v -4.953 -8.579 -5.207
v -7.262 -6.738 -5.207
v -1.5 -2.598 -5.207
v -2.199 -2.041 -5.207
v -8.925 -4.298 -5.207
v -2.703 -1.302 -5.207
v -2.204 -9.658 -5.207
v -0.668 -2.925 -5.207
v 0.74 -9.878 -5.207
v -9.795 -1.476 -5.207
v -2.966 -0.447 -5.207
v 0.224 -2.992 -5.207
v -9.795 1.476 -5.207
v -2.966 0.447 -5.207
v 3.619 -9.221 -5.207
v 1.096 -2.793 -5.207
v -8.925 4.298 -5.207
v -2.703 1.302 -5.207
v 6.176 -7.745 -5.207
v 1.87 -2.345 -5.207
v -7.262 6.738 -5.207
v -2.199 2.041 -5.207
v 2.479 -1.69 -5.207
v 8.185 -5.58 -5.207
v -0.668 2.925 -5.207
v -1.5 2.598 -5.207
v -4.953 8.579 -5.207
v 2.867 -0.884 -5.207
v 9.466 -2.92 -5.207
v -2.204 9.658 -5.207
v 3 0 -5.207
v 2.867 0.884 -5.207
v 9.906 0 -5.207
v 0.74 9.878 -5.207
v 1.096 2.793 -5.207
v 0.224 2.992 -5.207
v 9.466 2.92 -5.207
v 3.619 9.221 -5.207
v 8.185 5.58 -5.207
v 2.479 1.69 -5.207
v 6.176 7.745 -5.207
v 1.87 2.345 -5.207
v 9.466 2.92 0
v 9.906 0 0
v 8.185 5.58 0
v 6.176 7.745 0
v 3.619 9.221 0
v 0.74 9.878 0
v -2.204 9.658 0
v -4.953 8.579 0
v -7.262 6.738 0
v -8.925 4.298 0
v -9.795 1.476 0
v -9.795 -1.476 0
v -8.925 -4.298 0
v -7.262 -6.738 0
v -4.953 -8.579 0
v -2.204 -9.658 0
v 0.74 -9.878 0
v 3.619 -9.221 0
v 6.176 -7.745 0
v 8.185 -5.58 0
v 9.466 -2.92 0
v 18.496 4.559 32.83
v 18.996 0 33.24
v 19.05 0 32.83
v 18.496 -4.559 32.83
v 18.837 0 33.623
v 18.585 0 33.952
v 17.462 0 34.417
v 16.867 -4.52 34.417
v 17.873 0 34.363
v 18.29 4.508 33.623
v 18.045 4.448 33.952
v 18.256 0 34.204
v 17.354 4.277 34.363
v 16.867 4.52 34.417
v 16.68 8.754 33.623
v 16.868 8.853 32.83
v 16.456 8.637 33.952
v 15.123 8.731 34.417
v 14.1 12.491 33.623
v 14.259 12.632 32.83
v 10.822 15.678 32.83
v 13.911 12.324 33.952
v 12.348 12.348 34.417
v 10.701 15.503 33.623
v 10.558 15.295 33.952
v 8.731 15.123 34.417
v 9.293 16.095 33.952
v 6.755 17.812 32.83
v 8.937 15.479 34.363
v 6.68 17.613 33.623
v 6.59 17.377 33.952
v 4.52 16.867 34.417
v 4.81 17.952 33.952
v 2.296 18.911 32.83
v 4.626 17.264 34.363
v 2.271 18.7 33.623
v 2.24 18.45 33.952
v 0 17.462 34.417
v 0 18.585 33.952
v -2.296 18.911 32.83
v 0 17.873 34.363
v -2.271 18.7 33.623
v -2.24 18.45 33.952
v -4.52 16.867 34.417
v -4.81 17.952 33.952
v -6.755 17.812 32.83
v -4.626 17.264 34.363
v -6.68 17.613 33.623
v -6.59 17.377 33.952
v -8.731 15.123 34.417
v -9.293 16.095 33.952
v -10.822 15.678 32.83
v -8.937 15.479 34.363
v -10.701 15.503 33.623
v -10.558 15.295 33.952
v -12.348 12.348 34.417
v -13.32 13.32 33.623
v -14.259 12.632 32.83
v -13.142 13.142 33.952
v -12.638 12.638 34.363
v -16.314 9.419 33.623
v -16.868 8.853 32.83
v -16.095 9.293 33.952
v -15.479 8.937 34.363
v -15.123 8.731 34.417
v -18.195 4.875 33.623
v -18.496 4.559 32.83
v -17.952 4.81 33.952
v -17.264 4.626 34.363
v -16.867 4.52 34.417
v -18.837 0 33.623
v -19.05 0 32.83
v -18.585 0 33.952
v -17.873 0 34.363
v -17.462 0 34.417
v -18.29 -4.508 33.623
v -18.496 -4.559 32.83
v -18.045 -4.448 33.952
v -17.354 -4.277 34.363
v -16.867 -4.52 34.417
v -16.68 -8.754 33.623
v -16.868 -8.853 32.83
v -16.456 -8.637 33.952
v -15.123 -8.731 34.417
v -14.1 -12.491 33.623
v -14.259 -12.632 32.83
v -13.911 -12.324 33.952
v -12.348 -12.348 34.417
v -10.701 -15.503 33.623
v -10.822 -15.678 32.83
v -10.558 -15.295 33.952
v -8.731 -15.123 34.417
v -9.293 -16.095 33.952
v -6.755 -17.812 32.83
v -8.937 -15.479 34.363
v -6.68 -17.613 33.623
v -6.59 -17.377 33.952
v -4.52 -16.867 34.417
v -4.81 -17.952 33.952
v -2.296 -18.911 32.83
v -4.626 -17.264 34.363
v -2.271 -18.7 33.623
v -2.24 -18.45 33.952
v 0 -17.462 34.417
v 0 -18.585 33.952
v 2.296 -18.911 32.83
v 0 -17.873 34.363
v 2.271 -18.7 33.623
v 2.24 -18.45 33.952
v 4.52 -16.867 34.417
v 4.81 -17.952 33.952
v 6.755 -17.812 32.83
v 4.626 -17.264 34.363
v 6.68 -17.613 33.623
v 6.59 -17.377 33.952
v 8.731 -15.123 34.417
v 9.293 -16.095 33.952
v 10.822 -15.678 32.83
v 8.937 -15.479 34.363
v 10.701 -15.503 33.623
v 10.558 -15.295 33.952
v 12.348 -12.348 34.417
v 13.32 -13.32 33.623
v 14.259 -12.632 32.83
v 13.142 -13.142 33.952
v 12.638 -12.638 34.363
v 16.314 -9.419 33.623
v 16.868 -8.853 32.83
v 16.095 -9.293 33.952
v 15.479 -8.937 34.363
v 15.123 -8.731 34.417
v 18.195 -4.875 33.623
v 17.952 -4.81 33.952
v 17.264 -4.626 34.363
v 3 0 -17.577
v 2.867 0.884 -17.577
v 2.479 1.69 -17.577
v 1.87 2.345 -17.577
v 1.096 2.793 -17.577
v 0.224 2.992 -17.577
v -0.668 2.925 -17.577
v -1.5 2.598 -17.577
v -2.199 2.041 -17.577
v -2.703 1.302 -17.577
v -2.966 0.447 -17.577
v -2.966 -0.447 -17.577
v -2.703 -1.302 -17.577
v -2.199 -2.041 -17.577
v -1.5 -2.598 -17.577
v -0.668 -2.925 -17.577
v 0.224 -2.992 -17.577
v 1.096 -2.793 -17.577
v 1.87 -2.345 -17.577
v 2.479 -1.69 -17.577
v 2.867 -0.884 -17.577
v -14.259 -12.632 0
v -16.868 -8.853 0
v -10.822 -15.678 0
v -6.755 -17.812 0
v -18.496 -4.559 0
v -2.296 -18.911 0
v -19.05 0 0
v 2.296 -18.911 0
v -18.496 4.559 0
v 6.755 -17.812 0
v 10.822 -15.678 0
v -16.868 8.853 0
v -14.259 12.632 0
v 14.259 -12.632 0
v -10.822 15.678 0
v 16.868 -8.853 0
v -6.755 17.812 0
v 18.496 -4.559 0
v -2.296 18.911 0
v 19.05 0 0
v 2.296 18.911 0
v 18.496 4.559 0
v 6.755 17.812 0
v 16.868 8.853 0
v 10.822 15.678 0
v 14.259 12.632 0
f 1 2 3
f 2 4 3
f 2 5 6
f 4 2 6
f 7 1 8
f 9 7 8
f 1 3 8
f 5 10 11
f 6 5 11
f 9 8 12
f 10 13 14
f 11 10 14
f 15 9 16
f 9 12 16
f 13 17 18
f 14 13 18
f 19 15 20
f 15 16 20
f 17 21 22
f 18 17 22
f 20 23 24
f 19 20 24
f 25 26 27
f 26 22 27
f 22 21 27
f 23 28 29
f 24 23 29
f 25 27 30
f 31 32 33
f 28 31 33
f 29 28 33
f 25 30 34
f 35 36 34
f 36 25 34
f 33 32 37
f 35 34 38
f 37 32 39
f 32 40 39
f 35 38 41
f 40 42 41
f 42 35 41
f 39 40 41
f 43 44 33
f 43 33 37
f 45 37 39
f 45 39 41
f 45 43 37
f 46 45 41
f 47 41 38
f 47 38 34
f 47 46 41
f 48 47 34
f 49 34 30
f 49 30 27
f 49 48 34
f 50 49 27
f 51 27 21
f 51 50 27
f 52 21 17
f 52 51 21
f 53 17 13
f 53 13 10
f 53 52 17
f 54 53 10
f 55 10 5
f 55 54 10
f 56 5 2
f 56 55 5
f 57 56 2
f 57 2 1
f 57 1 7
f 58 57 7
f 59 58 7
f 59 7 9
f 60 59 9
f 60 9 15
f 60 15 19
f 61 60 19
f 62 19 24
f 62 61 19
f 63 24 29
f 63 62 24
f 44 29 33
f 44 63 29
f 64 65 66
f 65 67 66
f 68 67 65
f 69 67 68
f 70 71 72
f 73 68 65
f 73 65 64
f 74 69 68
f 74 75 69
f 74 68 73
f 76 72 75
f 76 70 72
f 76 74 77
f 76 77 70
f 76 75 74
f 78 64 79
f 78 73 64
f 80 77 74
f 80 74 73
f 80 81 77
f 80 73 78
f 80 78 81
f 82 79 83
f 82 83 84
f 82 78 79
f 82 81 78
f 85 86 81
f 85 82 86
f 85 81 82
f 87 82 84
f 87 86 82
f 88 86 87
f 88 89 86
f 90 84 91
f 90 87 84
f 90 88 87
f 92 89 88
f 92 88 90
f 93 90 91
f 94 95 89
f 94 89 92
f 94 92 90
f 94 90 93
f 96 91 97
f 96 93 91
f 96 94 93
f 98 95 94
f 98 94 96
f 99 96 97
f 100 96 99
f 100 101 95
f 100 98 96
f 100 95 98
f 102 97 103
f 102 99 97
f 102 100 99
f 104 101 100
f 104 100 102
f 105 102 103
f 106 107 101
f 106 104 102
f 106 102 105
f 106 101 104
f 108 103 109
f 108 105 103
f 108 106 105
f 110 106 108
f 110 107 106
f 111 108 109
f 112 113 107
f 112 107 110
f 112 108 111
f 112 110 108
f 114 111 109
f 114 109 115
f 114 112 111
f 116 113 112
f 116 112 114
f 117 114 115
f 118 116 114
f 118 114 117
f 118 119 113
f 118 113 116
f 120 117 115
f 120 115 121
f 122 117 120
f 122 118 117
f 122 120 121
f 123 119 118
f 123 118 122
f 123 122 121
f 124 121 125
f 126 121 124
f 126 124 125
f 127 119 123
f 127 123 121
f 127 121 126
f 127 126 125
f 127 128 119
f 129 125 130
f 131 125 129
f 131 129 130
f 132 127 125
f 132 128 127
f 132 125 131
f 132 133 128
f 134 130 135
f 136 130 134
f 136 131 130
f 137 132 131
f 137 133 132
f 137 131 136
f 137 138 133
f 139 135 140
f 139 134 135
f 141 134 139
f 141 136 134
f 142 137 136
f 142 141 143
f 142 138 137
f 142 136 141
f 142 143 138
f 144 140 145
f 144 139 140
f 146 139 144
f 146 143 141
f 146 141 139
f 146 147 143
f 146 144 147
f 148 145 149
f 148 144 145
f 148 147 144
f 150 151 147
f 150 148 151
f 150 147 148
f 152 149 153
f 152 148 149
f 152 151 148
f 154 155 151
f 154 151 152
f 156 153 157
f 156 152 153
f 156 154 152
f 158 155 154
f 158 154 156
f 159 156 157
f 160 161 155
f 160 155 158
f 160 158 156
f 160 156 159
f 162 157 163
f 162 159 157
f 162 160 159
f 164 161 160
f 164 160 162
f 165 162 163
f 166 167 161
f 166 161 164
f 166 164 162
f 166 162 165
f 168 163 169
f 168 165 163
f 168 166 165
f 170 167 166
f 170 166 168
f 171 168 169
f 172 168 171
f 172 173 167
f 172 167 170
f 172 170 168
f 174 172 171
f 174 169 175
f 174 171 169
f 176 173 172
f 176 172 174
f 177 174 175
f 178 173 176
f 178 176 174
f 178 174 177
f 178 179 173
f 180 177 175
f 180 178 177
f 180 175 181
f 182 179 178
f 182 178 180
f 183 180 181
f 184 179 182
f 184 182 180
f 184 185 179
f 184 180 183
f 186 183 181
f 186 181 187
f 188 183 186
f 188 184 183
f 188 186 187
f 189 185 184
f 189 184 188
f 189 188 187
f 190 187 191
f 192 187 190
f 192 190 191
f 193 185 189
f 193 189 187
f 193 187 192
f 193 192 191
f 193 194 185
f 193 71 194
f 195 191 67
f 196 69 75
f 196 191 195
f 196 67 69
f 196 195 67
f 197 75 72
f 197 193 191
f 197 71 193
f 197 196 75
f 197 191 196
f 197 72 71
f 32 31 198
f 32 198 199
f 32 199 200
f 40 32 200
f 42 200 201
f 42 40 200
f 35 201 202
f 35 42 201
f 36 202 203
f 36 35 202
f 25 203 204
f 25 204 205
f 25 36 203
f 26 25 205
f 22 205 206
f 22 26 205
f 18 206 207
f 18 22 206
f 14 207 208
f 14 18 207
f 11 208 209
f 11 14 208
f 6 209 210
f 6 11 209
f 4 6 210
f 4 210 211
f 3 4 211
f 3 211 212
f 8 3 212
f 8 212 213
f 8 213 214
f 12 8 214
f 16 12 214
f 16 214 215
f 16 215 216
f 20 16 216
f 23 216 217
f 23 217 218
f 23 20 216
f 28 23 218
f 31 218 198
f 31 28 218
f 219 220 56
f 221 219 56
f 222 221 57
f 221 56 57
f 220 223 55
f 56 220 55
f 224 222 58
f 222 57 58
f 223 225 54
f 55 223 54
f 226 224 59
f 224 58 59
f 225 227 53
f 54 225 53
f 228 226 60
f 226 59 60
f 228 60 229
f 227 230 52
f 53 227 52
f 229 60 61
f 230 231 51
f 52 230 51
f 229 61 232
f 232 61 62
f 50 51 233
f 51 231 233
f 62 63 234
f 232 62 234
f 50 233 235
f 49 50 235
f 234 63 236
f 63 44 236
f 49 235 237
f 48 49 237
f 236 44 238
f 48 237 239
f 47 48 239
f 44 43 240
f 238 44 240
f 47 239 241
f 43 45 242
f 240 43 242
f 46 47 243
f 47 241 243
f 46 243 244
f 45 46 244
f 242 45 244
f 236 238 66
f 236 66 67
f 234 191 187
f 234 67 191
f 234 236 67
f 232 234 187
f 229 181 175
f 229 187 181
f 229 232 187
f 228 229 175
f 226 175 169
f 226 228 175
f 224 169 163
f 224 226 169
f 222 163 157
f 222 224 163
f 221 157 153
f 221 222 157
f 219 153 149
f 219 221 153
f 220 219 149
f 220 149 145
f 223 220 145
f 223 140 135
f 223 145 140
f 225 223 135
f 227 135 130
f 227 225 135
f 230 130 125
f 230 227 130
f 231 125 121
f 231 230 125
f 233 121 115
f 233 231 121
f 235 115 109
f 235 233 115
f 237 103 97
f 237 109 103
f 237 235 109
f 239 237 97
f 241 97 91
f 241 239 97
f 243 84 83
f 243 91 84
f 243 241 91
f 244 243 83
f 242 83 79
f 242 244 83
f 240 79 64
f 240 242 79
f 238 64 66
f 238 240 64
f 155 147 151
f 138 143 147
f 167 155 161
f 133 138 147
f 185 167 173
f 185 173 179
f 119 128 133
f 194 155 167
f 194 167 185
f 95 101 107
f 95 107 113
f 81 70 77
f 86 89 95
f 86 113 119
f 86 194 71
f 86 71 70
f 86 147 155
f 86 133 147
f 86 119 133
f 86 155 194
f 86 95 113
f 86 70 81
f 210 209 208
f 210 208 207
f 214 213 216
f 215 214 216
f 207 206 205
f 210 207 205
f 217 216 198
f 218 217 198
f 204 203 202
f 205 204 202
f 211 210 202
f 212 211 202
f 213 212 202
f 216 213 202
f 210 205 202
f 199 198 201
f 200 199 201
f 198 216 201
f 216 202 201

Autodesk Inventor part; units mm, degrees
ref_plane "YZ Plane" through (0, 0, 0) normal (1, 0, 0) x (0, 1, 0)
ref_plane "XZ Plane" through (0, 0, 0) normal (0, 1, 0) x (-1, 0, 0)
ref_plane "XY Plane" through (0, 0, 0) normal (0, 0, 1) x (1, 0, 0)
sketch "Sketch1" plane through (0, 0, 0) normal (0, 0, 1) x (1, 0, 0)
  circle A0 centre (0, 0) radius 19.05
  circle A1 centre (0, 0) radius 9.906
  circle A2 centre (0, 0) radius 3
  dimension "d0" = 38.1
  dimension "d1" = 19.812
  dimension "d2" = 6
extrude "Extrusion1" add sketch "Sketch1" along normal blind 34.417 contours A0 | A1 | A2
extrude "Extrusion2" add sketch "Sketch1" against normal blind 5.207 contours A1
extrude "Extrusion3" add sketch "Sketch1" against normal blind 17.5768 contours A2
fillet "Fillet1" radius 1.5875 1 edges at (-19.05, 0, 34.417)
properties part number "OpticalRotaryEncoder"
